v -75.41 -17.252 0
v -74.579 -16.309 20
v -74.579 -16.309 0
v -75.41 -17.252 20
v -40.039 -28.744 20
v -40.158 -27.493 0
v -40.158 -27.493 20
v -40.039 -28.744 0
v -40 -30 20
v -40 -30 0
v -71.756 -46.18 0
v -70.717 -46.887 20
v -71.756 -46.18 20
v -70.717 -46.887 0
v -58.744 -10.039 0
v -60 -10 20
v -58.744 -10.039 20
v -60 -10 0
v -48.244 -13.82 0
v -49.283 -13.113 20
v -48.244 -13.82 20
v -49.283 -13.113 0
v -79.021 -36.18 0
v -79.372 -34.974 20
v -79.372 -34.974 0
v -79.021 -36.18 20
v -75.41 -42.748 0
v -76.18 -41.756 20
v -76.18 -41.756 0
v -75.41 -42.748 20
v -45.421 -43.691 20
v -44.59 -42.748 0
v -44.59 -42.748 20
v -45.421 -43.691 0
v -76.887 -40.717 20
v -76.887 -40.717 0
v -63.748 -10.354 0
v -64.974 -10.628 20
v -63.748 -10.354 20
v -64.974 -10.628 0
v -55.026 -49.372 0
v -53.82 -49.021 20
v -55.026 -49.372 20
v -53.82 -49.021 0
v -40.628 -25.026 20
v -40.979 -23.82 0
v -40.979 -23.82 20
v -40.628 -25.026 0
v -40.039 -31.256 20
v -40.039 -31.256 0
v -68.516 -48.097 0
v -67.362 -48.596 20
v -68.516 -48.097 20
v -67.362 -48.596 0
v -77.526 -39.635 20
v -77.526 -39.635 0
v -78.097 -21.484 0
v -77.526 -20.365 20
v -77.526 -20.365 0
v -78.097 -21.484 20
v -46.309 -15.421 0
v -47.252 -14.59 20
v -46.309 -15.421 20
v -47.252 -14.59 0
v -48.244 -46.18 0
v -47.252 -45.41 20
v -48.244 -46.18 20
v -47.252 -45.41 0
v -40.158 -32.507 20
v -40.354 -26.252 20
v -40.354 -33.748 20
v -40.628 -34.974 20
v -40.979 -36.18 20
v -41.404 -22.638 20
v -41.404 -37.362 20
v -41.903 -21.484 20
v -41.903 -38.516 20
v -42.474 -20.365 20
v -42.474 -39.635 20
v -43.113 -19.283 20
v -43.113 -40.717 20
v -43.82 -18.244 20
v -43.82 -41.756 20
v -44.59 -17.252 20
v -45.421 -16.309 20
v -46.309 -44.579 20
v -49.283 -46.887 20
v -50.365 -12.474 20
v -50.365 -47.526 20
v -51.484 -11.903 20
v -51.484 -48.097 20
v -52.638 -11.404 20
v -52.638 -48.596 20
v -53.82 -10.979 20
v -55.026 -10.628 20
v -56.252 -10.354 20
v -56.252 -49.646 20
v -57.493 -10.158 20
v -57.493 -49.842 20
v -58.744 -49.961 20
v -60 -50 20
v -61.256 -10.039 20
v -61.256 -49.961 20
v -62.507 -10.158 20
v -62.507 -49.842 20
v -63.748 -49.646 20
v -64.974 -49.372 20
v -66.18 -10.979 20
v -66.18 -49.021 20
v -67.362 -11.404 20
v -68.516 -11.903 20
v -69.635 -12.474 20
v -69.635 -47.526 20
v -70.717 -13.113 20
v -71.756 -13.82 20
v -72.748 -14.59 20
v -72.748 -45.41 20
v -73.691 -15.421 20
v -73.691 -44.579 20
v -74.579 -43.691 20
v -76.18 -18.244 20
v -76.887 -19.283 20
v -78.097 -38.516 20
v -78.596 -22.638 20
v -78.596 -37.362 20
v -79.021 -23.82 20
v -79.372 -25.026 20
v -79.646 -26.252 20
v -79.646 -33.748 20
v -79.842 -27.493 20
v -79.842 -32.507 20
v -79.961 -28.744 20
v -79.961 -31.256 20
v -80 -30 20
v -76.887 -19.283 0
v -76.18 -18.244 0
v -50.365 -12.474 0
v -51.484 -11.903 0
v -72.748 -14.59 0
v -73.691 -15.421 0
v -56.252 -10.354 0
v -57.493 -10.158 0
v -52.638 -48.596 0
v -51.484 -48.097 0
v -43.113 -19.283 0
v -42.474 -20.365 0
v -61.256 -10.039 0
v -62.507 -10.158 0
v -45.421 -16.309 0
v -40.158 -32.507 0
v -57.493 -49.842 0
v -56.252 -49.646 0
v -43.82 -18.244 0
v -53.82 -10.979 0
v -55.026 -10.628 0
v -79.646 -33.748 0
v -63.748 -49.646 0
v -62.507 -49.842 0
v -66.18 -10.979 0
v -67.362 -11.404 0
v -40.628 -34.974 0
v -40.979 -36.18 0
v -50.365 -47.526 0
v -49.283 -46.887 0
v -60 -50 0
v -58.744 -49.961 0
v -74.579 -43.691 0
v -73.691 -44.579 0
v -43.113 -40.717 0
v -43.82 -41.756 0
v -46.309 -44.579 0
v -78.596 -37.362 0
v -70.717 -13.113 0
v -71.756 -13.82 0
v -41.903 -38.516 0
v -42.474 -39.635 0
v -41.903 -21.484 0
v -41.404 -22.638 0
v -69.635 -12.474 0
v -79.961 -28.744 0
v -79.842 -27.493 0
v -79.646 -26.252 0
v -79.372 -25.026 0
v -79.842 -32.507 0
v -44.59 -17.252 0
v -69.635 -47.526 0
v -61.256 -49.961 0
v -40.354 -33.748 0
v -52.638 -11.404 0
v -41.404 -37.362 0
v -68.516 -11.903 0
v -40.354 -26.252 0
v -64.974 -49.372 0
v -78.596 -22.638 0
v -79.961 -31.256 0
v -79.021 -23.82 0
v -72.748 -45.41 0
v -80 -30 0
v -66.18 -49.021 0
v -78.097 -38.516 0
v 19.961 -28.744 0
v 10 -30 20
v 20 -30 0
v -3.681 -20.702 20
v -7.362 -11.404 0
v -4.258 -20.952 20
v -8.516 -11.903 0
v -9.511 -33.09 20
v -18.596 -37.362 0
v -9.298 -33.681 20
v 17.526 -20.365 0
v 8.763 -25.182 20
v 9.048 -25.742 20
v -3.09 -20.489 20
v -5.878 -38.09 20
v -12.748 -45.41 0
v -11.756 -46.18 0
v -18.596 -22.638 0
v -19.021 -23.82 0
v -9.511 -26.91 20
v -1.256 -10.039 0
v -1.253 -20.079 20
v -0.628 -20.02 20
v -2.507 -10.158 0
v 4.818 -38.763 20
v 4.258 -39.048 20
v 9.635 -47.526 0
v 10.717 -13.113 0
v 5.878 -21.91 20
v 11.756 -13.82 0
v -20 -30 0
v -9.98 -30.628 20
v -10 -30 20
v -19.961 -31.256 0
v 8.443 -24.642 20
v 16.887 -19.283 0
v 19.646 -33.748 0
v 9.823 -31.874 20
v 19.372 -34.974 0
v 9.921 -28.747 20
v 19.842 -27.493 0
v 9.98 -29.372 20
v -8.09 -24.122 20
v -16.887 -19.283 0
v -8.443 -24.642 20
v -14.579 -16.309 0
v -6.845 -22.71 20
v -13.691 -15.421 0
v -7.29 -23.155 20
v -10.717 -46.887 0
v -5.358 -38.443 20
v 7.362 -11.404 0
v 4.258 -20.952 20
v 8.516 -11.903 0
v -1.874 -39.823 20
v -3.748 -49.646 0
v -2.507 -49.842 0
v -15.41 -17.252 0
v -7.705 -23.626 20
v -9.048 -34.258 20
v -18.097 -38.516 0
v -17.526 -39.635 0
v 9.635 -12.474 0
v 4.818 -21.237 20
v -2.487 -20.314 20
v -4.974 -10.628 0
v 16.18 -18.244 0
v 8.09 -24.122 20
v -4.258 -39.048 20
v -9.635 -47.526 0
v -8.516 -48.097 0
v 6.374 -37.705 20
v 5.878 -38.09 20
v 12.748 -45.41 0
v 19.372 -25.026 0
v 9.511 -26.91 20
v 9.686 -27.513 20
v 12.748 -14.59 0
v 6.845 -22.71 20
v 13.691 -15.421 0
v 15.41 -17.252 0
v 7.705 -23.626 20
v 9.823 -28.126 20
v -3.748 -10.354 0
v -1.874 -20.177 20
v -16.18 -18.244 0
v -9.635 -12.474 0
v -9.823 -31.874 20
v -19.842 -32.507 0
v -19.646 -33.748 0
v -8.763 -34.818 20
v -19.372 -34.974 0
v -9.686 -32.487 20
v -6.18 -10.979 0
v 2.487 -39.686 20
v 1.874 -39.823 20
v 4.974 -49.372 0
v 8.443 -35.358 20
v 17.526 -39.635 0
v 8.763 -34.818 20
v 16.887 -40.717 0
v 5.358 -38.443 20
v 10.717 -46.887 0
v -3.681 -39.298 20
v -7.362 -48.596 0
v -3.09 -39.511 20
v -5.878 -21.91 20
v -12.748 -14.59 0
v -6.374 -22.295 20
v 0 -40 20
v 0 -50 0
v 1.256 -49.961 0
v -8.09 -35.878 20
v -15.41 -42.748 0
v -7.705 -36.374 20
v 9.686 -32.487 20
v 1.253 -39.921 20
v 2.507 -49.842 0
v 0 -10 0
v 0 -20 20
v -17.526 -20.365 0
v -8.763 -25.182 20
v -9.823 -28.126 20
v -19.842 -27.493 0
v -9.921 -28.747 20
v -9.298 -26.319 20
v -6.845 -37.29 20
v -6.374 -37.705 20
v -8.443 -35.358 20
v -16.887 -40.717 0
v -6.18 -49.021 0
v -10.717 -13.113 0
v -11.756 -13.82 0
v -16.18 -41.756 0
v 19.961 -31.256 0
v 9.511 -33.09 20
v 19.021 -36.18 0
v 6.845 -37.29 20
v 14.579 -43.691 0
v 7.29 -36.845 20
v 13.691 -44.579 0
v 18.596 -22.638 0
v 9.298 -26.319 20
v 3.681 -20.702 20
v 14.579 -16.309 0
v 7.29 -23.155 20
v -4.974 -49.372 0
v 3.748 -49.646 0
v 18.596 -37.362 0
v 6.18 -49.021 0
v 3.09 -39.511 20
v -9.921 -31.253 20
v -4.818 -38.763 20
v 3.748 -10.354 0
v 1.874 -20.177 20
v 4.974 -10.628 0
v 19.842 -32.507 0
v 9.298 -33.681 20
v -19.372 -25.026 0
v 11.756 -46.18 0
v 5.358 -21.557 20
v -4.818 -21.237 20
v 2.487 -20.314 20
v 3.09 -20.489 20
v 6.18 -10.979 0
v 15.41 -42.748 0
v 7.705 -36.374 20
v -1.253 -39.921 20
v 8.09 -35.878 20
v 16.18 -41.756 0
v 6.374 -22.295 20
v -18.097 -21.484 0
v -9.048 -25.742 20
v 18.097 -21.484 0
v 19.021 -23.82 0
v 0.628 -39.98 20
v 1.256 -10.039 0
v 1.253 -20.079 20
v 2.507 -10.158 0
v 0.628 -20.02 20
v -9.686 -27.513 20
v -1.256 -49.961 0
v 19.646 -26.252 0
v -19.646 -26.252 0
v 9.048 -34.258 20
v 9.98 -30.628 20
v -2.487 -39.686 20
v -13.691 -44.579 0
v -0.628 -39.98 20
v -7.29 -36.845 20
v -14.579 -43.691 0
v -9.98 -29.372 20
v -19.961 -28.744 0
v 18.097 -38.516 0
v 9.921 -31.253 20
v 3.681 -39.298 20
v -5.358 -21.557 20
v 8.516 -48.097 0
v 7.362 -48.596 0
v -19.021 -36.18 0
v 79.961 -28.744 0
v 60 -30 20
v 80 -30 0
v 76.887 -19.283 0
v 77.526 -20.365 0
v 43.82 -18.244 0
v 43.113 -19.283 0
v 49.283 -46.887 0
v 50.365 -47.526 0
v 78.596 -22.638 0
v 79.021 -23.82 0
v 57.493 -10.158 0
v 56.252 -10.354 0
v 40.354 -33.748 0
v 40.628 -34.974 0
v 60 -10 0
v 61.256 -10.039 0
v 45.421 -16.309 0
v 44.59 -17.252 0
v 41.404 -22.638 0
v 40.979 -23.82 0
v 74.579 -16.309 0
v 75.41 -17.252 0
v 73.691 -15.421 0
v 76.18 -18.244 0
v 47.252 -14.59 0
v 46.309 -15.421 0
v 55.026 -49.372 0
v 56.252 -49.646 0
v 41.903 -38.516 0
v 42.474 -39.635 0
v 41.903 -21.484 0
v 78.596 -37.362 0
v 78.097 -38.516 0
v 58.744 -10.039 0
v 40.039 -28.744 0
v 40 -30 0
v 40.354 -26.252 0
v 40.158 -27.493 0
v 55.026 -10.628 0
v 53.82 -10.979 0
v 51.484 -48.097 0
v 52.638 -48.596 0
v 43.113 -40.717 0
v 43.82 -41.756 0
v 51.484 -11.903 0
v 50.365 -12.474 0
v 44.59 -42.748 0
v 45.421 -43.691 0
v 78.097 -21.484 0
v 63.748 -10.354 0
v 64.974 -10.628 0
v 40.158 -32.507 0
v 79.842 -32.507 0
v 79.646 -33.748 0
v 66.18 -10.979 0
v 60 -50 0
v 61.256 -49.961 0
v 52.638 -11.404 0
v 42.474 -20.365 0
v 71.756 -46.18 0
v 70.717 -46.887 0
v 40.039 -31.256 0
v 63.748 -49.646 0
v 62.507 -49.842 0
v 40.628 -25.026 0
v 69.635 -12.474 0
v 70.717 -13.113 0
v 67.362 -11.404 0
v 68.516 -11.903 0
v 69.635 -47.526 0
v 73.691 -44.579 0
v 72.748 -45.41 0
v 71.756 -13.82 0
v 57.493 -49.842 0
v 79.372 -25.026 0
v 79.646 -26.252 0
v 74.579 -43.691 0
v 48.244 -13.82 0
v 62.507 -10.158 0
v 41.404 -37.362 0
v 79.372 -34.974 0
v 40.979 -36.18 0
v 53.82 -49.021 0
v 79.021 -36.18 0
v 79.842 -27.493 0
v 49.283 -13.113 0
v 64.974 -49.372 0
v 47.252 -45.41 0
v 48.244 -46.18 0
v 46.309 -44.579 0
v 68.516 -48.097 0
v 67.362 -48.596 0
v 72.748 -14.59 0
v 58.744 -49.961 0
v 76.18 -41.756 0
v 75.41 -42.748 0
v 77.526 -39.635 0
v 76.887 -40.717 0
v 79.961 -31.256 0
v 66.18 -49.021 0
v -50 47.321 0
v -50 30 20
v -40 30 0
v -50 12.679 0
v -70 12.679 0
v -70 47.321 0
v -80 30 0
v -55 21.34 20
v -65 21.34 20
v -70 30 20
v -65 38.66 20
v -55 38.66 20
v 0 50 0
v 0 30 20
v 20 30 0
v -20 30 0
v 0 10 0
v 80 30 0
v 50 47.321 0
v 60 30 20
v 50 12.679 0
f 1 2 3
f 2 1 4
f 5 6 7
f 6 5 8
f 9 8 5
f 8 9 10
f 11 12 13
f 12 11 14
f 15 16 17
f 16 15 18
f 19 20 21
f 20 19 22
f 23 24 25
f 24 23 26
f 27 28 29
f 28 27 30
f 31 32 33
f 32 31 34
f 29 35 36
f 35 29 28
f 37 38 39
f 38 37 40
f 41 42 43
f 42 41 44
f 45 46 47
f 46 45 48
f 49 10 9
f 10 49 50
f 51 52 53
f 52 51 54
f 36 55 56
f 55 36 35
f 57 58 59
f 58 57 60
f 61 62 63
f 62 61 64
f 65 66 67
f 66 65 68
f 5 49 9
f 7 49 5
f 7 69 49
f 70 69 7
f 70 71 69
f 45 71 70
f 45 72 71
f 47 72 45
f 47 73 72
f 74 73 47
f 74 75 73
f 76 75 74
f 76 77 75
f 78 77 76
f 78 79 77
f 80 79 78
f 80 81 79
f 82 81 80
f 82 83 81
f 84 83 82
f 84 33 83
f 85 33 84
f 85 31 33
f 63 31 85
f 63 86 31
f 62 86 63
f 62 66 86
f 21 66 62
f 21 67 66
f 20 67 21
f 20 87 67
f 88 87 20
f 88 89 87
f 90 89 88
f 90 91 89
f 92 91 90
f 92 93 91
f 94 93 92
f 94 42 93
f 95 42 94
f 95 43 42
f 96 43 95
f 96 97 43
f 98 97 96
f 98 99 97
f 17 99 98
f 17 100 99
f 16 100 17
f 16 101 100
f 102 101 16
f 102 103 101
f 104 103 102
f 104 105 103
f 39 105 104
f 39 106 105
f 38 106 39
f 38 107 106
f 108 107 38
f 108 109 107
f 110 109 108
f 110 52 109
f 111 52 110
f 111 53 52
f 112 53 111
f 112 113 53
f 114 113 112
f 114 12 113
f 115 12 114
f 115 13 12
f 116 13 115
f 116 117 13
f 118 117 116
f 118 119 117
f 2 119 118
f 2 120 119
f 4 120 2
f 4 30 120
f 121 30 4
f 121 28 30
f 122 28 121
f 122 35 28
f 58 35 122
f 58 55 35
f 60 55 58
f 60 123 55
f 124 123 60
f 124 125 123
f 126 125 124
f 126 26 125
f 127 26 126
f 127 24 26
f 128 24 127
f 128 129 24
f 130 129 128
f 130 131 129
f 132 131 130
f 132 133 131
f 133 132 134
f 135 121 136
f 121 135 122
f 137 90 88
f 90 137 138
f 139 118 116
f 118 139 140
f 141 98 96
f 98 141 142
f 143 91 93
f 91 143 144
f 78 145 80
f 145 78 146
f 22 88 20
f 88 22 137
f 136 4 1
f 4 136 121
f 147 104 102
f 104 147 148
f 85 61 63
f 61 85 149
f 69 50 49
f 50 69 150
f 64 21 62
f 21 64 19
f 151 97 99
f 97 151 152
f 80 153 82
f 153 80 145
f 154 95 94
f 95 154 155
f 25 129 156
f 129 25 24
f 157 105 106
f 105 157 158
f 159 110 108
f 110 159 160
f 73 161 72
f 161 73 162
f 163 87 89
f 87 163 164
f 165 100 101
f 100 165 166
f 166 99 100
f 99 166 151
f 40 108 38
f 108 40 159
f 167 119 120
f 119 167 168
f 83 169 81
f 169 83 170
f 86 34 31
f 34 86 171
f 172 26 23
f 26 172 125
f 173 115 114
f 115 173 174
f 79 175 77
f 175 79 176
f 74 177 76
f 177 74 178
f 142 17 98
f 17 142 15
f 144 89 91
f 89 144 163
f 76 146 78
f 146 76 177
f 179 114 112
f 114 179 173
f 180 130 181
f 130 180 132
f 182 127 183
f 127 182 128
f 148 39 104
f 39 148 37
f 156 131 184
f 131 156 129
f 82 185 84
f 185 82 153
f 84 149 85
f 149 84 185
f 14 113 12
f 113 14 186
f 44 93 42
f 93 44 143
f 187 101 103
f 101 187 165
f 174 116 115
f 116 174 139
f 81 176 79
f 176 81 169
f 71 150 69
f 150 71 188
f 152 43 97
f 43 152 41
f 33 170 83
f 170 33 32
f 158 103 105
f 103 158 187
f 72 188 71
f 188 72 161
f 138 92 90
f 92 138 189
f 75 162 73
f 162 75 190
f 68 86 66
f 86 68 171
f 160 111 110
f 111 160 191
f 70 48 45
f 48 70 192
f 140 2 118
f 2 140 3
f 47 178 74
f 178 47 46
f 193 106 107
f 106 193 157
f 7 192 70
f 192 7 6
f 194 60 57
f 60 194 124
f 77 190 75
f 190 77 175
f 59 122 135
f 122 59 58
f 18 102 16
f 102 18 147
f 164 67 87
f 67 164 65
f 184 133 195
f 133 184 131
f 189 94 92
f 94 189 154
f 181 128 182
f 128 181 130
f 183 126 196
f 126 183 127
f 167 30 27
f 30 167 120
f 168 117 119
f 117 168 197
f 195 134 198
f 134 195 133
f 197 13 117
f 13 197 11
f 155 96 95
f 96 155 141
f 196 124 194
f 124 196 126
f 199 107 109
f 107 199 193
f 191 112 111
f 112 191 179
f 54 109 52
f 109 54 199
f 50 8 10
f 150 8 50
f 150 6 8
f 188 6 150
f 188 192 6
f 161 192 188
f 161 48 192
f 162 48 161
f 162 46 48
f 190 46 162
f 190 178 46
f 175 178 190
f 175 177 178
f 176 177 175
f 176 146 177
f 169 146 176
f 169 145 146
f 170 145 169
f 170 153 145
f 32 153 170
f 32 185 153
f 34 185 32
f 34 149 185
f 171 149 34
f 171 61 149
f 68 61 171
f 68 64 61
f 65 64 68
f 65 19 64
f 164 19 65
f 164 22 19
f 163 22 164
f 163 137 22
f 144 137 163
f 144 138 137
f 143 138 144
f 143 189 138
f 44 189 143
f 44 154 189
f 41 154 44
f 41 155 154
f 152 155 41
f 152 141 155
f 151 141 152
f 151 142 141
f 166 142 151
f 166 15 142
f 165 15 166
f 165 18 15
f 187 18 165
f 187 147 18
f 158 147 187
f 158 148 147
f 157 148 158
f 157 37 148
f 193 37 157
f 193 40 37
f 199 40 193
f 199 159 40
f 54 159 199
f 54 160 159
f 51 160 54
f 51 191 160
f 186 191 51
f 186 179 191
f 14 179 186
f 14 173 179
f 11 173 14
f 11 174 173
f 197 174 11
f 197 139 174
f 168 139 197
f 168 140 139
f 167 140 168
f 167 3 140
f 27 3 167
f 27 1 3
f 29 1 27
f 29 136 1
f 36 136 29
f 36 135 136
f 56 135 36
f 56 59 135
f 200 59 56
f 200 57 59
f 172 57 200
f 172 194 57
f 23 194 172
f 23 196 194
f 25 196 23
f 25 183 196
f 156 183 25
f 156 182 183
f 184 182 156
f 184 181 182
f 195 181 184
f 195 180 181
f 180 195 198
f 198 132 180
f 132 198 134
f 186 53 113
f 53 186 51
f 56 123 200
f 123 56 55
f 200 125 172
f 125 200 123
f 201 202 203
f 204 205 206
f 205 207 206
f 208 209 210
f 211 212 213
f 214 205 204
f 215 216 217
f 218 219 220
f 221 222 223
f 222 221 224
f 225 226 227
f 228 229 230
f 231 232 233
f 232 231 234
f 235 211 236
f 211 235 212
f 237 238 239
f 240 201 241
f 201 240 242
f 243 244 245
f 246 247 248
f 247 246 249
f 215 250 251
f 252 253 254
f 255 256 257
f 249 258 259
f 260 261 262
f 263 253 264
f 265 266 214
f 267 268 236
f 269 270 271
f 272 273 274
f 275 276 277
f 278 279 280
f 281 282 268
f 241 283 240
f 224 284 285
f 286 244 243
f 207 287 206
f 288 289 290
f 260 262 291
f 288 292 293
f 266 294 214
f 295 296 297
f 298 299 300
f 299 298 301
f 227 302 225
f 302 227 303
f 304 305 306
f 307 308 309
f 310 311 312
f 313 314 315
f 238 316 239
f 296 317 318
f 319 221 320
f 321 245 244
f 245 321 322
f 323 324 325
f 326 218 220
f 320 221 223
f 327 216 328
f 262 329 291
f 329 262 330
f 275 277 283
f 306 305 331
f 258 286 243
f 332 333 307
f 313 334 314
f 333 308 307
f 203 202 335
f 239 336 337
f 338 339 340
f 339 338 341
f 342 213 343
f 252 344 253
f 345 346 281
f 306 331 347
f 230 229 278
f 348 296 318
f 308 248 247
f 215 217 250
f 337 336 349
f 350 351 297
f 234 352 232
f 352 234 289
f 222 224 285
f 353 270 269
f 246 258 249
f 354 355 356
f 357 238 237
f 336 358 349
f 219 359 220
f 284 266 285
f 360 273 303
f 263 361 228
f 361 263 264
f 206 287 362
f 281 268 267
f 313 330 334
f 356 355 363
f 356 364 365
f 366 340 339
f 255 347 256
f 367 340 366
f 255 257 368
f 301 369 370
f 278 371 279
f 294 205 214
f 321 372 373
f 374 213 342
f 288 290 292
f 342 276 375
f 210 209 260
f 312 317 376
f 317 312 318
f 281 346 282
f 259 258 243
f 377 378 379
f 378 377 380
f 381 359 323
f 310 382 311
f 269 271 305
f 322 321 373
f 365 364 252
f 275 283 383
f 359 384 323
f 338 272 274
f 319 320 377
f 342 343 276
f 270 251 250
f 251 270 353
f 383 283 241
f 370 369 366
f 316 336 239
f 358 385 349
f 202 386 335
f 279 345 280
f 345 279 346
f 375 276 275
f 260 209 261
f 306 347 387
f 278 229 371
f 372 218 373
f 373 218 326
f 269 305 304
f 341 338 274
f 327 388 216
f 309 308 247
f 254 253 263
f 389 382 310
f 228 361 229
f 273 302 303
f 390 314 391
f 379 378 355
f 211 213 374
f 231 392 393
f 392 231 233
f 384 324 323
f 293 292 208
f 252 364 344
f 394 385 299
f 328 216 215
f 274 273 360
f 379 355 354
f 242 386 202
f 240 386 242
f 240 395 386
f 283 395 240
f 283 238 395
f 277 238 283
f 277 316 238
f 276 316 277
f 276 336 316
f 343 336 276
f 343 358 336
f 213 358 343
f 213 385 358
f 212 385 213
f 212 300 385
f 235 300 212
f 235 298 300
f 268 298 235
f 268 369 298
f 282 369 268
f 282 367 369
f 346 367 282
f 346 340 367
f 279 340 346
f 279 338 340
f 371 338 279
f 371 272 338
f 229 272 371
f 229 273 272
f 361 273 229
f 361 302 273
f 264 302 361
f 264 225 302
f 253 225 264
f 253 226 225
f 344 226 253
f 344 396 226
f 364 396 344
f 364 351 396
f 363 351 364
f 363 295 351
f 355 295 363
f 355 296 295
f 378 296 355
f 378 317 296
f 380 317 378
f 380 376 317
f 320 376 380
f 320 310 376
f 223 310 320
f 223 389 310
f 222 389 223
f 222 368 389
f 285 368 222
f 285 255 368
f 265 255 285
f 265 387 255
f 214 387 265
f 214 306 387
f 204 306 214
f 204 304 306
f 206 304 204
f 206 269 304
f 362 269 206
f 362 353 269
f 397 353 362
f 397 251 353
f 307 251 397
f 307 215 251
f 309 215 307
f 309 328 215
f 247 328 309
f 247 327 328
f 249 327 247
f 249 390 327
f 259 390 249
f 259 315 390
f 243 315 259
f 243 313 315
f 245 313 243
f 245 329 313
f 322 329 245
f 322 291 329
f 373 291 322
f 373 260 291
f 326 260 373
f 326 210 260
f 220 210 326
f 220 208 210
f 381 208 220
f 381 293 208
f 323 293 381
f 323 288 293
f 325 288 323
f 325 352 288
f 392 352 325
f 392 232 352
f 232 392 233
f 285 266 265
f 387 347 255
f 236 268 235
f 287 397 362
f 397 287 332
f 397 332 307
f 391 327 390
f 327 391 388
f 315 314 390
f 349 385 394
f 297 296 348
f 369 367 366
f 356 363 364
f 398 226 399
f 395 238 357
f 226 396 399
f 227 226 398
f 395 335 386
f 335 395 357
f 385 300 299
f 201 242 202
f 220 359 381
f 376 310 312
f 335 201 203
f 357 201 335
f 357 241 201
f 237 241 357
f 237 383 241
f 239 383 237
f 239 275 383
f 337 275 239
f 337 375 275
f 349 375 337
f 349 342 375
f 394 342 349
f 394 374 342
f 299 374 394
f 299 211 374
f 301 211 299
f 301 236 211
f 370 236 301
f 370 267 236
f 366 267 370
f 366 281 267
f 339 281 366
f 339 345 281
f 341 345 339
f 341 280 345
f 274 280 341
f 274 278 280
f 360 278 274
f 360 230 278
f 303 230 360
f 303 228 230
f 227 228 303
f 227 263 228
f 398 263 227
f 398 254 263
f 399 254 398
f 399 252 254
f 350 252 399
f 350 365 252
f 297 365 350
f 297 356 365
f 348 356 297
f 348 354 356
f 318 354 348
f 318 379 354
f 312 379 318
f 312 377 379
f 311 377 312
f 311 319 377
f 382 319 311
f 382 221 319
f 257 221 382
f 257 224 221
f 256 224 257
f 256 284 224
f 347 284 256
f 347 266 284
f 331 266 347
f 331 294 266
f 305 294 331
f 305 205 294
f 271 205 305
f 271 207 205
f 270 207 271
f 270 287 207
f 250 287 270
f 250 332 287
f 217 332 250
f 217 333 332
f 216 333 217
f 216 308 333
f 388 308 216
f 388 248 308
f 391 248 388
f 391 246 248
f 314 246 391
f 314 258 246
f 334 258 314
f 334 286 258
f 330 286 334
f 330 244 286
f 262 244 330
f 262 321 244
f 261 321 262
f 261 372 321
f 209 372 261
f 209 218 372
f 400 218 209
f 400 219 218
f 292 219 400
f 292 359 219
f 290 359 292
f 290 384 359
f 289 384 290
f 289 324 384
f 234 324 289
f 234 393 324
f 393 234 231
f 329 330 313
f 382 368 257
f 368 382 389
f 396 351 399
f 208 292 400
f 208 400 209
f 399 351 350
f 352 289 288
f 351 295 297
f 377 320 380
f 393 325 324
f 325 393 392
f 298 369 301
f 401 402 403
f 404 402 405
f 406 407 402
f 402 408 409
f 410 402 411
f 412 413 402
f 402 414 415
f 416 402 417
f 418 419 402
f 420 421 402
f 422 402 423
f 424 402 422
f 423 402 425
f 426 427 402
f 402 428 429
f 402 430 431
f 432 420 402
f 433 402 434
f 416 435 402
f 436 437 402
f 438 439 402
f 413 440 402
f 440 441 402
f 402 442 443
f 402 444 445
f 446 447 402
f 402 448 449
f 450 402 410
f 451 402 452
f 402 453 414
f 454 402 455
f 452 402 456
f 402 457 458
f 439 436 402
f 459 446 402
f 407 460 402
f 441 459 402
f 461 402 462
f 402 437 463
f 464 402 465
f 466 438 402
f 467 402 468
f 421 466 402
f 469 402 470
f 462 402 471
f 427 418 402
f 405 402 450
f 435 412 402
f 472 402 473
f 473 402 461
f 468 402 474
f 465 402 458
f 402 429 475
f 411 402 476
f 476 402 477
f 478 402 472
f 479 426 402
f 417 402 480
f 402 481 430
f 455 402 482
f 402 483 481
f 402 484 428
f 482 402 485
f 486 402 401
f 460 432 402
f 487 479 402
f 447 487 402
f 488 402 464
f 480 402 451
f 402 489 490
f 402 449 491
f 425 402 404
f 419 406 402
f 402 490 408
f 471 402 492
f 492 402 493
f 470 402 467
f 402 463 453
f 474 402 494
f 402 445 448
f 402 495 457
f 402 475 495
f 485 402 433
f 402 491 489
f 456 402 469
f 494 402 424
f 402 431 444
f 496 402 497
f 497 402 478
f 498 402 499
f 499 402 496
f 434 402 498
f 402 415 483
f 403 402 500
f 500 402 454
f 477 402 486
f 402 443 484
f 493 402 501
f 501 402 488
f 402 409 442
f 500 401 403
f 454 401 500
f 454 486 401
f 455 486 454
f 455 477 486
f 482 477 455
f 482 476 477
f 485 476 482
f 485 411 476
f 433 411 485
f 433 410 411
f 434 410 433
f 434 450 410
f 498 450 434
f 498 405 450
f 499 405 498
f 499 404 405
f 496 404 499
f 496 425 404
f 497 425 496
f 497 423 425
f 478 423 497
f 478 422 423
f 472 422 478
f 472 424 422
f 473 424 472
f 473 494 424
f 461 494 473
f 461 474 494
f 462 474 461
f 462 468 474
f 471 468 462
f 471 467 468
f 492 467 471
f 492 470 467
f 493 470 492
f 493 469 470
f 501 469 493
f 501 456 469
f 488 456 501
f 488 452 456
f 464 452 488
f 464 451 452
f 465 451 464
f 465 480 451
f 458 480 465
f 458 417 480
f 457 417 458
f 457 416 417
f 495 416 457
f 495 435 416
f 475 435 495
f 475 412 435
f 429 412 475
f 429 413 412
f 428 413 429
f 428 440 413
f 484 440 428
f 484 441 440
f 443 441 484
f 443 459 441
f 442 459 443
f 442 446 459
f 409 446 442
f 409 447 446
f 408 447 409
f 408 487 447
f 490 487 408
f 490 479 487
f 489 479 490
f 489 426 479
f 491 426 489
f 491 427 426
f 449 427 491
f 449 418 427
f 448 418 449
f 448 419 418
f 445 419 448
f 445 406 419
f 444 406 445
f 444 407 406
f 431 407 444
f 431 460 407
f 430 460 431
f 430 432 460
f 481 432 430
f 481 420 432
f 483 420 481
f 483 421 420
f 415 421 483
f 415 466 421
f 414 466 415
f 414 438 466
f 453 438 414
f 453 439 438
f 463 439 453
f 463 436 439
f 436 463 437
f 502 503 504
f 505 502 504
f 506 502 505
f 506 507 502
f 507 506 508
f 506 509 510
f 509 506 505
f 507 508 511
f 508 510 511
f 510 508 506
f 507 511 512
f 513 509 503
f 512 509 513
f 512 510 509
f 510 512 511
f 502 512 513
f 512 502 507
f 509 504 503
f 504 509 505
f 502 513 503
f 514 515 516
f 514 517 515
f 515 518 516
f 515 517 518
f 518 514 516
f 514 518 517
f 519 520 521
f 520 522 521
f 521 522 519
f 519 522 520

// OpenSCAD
d = 60;

translate([-2*d/2, -d/2, 0]){

    translate([0,0,0]) cylinder(r=20,h=20,$fn=100);

    translate([d,0,0])cylinder(r1=20,r2=10, h=20,$fn=100);

    translate([2*d,0,0])cylinder(r1=20,r2=0, h=20,$fn=100);

    translate([0,d,0])cylinder(r1=20,r2=10, h=20,$fn=6);

    translate([d,d,0])cylinder(r1=20,r2=0, h=20,$fn=4);

    translate([2*d,d,0])cylinder(r1=20,r2=0, h=20,$fn=3);
}
